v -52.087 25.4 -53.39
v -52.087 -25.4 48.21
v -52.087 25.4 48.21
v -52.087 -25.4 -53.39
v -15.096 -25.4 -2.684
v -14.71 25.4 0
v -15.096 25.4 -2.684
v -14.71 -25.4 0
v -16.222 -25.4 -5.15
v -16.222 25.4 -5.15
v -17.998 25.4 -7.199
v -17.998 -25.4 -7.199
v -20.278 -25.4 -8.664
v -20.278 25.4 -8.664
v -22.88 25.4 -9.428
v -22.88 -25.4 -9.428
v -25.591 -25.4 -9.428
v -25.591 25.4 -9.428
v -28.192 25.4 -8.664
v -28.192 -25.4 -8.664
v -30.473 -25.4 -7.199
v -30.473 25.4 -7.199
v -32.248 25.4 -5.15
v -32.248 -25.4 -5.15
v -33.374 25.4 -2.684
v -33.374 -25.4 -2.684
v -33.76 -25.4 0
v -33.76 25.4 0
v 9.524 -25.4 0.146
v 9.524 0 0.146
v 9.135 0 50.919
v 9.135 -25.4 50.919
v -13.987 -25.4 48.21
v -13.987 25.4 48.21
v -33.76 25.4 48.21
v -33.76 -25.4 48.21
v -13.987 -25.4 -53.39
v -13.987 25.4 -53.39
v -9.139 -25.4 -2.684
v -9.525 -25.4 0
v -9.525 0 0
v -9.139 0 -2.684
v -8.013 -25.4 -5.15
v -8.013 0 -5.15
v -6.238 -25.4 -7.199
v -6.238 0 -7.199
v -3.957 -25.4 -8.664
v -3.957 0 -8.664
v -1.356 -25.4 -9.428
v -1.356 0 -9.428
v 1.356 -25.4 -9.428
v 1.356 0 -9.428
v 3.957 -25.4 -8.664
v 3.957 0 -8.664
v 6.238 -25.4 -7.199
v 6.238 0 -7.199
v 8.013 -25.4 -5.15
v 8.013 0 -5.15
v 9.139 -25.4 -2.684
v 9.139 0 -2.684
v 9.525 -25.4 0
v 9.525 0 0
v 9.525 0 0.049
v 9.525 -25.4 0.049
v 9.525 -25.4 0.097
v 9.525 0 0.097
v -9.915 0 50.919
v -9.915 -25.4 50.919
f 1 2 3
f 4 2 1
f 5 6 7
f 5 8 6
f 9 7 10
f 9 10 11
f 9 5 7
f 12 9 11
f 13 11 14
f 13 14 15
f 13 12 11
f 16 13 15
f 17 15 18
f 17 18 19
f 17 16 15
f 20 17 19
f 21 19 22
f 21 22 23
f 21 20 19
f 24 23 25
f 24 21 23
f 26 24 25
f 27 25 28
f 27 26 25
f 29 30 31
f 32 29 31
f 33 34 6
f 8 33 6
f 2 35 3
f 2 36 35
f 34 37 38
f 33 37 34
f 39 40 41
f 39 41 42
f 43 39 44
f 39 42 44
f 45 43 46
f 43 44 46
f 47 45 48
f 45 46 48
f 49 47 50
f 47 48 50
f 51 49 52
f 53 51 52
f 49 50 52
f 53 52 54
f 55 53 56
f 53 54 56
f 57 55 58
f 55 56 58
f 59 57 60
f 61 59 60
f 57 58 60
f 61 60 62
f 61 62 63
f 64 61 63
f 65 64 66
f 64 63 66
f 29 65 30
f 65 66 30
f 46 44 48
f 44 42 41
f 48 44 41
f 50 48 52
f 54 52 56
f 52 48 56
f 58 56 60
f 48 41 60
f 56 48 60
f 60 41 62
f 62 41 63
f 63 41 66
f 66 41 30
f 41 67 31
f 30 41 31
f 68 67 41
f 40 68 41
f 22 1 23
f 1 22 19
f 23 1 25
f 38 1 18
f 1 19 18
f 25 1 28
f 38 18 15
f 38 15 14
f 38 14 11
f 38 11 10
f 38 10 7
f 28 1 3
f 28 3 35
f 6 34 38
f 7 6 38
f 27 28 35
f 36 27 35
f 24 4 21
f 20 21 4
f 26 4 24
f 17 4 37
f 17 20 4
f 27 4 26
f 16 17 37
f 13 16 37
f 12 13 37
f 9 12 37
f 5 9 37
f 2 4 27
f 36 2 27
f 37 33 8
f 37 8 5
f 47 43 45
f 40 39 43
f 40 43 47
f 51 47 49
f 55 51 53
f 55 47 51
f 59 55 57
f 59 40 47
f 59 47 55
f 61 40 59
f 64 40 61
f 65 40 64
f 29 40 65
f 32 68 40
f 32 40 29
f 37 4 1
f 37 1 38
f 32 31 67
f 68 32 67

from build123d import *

# Parameters (mm, degrees)
F1_DEPTH = 25.4
F3_DEPTH = 25.4
F4_DEPTH = 25.4


with BuildPart() as f1:
    # F0 (on Front) → F1 (new body)
    with BuildSketch(Plane.XZ):
        with BuildLine():
            ThreePointArc((9.523884, 0.145835), (-0.07292, 9.524721), (-9.525, 0))
            ThreePointArc((-9.525, 0), (0, -9.525), (9.525, 0))
            Line((9.525, 0), (9.523884, 0.145835))
        make_face()
        with BuildLine():
            Line((-9.914824, 50.918512), (-9.525, 0))
            ThreePointArc((-9.525, 0), (-0.07292, 9.524721), (9.523884, 0.145835))
            Line((9.523884, 0.145835), (9.135176, 50.918512))
            Line((9.135176, 50.918512), (-9.914824, 50.918512))
        make_face()
        with BuildLine():
            Line((9.523884, 0.145835), (9.525, 0))
            ThreePointArc((9.525, 0), (9.524721, 0.07292), (9.523884, 0.145835))
        make_face()
    extrude(amount=F1_DEPTH)

    # F2 (on Front) → F3 (cut)
    with BuildSketch(Plane.XZ):
        with BuildLine():
            Line((-13.98671, 48.209866), (-33.76022, 48.209866))
            Line((-33.76022, 48.209866), (-33.76022, 0))
            ThreePointArc((-33.76022, 0), (-24.23522, 9.525), (-14.71022, 0))
            Line((-14.71022, 0), (-13.98671, 48.209866))
        make_face()
        with BuildLine():
            ThreePointArc((-14.71022, 0), (-24.23522, 9.525), (-33.76022, 0))
            Line((-33.76022, 0), (-14.71022, 0))
        make_face()
        with BuildLine():
            Line((-14.71022, 0), (-33.76022, 0))
            ThreePointArc((-33.76022, 0), (-24.23522, -9.525), (-14.71022, 0))
        make_face()
    extrude(amount=-F3_DEPTH, mode=Mode.SUBTRACT)


with BuildPart() as f4:
    # F2 (on Front) → F4 (new body, symmetric)
    with BuildSketch(Plane.XZ):
        with BuildLine():
            Line((-33.76022, 48.209866), (-52.08671, 48.209866))
            Line((-52.08671, 48.209866), (-52.08671, -53.390134))
            Line((-52.08671, -53.390134), (-13.98671, -53.390134))
            Line((-13.98671, -53.390134), (-13.98671, 48.209866))
            Line((-13.98671, 48.209866), (-14.71022, 0))
            ThreePointArc((-14.71022, 0), (-24.23522, -9.525), (-33.76022, 0))
            Line((-33.76022, 0), (-33.76022, 48.209866))
        make_face()
    extrude(amount=F4_DEPTH, both=True)


solid = Compound([f1.part, f4.part])
